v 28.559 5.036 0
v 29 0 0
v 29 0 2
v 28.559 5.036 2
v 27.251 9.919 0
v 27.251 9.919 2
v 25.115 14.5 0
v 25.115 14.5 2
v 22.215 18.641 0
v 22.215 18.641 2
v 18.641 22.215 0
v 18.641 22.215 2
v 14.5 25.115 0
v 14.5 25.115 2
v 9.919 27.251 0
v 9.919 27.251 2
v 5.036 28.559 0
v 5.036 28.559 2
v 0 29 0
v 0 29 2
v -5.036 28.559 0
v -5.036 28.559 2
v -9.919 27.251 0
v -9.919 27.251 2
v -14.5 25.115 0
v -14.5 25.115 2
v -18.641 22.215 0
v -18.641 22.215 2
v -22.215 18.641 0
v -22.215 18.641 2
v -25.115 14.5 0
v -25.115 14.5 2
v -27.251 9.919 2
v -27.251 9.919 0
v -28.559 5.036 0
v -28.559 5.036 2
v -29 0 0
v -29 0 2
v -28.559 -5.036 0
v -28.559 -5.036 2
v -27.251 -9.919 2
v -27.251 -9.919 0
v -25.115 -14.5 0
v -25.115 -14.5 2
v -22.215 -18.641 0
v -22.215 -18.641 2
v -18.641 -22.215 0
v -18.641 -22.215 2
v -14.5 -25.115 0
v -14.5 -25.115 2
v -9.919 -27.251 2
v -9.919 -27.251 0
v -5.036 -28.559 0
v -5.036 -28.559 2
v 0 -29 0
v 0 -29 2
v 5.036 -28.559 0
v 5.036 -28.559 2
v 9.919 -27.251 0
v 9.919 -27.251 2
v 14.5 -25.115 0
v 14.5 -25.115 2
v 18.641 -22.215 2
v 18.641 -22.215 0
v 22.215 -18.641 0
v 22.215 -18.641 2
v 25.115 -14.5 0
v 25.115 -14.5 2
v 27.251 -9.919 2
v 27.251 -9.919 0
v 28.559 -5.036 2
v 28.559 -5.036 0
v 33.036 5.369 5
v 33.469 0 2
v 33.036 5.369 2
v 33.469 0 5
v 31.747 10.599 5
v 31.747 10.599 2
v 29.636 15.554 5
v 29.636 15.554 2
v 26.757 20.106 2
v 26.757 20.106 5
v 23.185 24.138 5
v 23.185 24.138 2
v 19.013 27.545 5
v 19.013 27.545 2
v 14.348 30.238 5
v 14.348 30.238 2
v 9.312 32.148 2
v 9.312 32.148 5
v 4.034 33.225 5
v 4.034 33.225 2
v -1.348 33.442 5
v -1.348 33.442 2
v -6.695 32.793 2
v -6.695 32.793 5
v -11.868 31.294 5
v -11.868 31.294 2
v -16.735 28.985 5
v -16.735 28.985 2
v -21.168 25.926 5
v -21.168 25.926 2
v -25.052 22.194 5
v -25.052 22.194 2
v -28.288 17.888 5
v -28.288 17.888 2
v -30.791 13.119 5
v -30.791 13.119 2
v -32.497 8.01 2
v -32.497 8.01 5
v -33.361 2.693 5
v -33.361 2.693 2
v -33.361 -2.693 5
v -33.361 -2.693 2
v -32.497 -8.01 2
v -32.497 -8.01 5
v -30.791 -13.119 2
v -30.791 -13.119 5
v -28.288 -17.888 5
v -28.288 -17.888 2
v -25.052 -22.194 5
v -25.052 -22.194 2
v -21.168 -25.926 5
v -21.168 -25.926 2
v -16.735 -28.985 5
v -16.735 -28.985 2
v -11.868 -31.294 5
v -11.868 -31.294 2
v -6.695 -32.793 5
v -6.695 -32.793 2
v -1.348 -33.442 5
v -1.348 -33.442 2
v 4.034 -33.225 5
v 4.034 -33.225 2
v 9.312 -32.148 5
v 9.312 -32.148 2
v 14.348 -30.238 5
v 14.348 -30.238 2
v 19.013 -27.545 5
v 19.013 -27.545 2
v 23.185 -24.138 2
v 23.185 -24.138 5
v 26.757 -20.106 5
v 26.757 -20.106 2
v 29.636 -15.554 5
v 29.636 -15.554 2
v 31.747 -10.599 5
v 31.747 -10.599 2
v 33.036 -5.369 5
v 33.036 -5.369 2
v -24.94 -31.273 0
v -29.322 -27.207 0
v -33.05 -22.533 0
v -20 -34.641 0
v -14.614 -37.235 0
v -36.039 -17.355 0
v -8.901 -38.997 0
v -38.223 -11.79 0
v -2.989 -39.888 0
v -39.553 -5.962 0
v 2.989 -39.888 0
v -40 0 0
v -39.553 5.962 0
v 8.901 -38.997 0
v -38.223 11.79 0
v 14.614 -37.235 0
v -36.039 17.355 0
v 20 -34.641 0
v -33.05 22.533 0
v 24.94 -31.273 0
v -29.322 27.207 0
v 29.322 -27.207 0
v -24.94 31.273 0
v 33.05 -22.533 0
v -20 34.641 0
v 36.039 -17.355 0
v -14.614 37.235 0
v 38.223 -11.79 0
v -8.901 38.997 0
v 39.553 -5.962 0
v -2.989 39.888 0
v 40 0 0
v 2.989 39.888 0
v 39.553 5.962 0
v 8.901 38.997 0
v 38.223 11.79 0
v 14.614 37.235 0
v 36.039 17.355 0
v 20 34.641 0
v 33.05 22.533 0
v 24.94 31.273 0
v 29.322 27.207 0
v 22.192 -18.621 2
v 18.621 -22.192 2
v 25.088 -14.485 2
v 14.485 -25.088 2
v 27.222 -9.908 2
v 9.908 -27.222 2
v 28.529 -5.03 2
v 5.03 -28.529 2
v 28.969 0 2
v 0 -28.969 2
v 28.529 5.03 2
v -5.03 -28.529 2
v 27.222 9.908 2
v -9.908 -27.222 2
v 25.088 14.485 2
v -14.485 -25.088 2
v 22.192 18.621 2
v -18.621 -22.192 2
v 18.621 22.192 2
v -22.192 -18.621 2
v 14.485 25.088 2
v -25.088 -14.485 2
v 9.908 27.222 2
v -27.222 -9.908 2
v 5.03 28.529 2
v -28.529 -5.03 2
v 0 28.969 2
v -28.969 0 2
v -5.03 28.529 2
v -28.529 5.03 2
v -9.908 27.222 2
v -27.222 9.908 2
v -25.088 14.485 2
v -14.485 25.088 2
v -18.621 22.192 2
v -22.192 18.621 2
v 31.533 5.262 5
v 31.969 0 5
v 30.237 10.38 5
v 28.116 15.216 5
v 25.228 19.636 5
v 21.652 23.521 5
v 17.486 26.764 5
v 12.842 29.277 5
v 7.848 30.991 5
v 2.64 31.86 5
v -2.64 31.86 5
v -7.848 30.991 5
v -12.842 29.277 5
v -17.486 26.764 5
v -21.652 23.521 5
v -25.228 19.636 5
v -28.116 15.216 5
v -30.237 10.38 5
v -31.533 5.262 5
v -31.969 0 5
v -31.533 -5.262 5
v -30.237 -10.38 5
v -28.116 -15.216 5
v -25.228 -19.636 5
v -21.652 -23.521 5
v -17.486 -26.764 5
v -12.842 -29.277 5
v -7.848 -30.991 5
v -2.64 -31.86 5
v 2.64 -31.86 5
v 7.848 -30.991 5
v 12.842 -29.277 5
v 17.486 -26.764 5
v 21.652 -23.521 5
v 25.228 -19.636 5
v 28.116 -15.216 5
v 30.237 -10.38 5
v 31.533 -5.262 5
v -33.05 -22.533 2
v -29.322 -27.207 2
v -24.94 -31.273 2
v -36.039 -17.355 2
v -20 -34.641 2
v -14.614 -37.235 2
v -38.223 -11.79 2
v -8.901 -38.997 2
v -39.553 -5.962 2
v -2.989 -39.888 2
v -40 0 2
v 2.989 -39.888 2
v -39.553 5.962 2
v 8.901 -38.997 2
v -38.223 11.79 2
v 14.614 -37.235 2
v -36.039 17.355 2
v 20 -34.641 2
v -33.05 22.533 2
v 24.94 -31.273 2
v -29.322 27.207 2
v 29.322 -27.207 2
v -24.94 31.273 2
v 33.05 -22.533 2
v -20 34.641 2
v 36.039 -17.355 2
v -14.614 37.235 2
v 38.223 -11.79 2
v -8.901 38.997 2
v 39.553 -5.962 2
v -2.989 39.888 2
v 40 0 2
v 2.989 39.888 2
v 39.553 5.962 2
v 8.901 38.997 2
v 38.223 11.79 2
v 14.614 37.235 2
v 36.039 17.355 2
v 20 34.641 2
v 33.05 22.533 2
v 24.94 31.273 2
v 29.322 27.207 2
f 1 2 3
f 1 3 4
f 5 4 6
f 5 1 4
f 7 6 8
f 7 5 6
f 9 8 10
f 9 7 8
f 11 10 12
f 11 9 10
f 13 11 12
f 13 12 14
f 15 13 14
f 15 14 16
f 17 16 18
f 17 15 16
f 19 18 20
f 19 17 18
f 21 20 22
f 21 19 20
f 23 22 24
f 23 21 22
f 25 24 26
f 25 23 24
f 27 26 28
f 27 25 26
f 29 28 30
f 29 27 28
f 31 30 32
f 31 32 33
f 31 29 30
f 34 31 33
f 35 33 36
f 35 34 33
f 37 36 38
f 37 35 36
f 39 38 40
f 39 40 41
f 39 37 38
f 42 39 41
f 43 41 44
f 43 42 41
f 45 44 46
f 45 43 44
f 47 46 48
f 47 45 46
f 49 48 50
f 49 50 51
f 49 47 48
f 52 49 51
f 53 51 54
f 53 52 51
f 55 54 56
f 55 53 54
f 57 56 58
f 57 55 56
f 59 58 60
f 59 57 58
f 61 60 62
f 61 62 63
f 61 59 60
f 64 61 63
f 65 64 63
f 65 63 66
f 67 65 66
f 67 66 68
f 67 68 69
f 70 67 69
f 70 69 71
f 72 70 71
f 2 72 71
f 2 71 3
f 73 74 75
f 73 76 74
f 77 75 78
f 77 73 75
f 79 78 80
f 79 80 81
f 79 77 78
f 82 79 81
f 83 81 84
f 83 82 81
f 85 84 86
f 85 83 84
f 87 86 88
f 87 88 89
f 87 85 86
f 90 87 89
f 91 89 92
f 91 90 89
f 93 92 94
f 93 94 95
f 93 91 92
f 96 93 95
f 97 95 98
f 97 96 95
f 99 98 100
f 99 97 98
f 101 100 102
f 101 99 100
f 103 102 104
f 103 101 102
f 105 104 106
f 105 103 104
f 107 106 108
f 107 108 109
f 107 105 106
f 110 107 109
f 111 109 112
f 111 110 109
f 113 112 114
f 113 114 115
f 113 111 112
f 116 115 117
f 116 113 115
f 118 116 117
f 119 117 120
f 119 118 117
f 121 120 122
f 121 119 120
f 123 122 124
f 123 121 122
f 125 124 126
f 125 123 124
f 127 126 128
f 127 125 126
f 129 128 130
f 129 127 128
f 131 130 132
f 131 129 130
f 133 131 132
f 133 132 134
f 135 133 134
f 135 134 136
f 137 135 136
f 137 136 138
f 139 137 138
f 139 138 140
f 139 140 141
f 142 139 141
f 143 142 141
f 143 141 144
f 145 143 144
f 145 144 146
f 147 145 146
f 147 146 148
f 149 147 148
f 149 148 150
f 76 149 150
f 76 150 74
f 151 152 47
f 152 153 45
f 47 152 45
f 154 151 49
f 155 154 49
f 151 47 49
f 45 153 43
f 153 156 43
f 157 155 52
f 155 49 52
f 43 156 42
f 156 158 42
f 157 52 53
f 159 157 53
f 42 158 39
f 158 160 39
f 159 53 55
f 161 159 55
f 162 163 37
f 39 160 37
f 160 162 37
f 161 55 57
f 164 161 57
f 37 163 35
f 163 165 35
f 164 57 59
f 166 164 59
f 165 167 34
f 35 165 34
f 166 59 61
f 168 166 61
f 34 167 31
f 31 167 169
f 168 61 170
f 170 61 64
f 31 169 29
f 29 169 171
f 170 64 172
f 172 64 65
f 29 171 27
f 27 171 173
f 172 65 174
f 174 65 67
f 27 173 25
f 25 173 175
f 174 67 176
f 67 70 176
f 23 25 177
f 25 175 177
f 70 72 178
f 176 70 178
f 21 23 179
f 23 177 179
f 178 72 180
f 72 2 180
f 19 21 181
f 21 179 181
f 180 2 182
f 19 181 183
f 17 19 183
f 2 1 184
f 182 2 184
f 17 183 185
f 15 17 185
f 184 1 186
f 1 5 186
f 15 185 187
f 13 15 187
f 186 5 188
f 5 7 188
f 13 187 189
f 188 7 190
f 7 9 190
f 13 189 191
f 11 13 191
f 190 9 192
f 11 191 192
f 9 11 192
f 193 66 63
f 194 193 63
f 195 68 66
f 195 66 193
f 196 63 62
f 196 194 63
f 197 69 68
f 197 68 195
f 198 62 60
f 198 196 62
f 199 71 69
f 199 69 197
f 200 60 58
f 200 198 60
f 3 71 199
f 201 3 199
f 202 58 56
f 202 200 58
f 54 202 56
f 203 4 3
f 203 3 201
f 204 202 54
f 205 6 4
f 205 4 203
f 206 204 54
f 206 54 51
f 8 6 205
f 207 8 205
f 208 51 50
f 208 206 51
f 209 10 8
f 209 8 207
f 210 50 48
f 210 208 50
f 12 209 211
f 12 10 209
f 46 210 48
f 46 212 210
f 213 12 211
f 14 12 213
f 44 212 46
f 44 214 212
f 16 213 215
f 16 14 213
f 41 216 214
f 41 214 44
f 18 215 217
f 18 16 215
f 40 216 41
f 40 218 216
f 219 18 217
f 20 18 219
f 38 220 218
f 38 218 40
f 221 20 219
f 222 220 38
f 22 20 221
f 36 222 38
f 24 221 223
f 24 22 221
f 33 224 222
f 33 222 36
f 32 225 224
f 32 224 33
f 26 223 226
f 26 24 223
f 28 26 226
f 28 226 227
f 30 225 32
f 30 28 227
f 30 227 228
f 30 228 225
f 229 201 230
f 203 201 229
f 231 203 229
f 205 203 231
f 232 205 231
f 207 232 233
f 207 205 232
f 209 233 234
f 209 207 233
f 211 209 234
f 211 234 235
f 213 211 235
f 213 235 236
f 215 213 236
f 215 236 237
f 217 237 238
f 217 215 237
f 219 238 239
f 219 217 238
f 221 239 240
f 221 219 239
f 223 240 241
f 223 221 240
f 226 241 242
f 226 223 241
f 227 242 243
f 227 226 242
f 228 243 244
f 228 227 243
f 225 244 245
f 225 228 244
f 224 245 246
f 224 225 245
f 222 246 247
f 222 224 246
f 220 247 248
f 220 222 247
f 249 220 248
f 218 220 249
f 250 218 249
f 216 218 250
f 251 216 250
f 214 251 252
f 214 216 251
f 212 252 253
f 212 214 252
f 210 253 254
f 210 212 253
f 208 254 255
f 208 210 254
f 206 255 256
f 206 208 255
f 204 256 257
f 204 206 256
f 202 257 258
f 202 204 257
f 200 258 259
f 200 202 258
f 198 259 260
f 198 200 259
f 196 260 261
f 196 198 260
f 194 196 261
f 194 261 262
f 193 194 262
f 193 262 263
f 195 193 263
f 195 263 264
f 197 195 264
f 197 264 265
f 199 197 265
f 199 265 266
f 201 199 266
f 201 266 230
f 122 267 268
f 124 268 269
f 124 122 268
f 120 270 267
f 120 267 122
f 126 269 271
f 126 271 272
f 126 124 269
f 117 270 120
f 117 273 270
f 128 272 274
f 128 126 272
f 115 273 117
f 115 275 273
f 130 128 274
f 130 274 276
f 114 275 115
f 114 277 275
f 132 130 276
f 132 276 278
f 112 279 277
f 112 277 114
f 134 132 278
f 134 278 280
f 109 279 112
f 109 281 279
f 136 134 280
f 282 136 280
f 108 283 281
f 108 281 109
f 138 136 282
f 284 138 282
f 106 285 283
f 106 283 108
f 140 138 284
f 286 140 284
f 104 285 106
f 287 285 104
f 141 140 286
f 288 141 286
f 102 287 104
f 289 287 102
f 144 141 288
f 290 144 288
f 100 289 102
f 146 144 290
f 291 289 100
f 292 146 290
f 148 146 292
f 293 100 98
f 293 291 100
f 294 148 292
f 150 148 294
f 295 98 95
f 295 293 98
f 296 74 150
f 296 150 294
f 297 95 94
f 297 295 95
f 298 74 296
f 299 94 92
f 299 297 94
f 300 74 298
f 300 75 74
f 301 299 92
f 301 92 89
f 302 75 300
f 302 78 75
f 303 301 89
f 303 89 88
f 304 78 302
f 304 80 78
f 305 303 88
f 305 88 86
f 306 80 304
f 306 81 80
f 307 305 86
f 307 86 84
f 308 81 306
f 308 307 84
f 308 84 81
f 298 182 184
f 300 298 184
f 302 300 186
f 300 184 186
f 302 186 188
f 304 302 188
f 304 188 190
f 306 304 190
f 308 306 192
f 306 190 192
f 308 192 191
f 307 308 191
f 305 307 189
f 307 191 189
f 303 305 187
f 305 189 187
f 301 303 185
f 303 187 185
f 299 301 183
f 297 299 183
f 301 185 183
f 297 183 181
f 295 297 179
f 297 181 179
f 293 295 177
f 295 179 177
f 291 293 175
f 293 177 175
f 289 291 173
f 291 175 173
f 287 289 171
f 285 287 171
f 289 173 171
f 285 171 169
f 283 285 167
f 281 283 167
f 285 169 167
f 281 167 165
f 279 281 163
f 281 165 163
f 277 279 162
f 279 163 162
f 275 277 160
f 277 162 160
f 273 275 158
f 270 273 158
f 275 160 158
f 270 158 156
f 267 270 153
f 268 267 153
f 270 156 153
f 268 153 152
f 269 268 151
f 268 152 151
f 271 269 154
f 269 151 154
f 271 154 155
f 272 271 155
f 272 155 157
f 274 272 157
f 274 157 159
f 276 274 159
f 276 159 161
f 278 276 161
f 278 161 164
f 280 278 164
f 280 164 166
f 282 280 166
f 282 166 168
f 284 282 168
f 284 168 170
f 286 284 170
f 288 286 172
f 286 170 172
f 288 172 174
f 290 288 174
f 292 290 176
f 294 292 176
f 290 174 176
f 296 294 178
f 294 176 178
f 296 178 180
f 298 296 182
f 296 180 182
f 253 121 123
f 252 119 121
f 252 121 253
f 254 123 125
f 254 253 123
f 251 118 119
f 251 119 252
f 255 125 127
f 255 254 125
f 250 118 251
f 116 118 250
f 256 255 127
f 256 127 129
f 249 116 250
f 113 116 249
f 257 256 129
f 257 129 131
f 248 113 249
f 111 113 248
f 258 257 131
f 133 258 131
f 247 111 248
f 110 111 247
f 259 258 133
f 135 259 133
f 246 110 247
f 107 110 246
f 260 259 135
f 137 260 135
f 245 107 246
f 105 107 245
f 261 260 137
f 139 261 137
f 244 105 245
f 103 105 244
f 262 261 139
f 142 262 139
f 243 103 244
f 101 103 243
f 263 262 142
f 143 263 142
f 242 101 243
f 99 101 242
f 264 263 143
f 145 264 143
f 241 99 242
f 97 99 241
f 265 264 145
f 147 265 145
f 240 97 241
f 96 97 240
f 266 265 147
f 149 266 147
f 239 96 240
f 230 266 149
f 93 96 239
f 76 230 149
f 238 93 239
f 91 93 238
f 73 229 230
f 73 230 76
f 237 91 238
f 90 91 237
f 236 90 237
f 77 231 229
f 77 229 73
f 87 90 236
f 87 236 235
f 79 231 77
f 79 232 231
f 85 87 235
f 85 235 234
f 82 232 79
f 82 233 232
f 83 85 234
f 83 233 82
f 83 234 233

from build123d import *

# Parameters (mm, degrees)
F0_R     = 40
F0_R_2   = 29
F1_DEPTH = 2


with BuildPart() as f1:
    # F0 (on Top) → F1 (new body)
    with BuildSketch(Plane.XY):
        Circle(F0_R)
        Circle(F0_R_2, mode=Mode.SUBTRACT)
    extrude(amount=F1_DEPTH)

    # F2 (on Front) → F3 (revolve)
    with BuildSketch(Plane.XZ):
        Polygon((31.969388, 5), (28.969388, 2), (31.969388, 2), (33.469388, 2), (33.469388, 5), align=None)
    revolve(axis=Axis((0, 0, 4.160745), (0, 0, 1)))


solid = f1.part
